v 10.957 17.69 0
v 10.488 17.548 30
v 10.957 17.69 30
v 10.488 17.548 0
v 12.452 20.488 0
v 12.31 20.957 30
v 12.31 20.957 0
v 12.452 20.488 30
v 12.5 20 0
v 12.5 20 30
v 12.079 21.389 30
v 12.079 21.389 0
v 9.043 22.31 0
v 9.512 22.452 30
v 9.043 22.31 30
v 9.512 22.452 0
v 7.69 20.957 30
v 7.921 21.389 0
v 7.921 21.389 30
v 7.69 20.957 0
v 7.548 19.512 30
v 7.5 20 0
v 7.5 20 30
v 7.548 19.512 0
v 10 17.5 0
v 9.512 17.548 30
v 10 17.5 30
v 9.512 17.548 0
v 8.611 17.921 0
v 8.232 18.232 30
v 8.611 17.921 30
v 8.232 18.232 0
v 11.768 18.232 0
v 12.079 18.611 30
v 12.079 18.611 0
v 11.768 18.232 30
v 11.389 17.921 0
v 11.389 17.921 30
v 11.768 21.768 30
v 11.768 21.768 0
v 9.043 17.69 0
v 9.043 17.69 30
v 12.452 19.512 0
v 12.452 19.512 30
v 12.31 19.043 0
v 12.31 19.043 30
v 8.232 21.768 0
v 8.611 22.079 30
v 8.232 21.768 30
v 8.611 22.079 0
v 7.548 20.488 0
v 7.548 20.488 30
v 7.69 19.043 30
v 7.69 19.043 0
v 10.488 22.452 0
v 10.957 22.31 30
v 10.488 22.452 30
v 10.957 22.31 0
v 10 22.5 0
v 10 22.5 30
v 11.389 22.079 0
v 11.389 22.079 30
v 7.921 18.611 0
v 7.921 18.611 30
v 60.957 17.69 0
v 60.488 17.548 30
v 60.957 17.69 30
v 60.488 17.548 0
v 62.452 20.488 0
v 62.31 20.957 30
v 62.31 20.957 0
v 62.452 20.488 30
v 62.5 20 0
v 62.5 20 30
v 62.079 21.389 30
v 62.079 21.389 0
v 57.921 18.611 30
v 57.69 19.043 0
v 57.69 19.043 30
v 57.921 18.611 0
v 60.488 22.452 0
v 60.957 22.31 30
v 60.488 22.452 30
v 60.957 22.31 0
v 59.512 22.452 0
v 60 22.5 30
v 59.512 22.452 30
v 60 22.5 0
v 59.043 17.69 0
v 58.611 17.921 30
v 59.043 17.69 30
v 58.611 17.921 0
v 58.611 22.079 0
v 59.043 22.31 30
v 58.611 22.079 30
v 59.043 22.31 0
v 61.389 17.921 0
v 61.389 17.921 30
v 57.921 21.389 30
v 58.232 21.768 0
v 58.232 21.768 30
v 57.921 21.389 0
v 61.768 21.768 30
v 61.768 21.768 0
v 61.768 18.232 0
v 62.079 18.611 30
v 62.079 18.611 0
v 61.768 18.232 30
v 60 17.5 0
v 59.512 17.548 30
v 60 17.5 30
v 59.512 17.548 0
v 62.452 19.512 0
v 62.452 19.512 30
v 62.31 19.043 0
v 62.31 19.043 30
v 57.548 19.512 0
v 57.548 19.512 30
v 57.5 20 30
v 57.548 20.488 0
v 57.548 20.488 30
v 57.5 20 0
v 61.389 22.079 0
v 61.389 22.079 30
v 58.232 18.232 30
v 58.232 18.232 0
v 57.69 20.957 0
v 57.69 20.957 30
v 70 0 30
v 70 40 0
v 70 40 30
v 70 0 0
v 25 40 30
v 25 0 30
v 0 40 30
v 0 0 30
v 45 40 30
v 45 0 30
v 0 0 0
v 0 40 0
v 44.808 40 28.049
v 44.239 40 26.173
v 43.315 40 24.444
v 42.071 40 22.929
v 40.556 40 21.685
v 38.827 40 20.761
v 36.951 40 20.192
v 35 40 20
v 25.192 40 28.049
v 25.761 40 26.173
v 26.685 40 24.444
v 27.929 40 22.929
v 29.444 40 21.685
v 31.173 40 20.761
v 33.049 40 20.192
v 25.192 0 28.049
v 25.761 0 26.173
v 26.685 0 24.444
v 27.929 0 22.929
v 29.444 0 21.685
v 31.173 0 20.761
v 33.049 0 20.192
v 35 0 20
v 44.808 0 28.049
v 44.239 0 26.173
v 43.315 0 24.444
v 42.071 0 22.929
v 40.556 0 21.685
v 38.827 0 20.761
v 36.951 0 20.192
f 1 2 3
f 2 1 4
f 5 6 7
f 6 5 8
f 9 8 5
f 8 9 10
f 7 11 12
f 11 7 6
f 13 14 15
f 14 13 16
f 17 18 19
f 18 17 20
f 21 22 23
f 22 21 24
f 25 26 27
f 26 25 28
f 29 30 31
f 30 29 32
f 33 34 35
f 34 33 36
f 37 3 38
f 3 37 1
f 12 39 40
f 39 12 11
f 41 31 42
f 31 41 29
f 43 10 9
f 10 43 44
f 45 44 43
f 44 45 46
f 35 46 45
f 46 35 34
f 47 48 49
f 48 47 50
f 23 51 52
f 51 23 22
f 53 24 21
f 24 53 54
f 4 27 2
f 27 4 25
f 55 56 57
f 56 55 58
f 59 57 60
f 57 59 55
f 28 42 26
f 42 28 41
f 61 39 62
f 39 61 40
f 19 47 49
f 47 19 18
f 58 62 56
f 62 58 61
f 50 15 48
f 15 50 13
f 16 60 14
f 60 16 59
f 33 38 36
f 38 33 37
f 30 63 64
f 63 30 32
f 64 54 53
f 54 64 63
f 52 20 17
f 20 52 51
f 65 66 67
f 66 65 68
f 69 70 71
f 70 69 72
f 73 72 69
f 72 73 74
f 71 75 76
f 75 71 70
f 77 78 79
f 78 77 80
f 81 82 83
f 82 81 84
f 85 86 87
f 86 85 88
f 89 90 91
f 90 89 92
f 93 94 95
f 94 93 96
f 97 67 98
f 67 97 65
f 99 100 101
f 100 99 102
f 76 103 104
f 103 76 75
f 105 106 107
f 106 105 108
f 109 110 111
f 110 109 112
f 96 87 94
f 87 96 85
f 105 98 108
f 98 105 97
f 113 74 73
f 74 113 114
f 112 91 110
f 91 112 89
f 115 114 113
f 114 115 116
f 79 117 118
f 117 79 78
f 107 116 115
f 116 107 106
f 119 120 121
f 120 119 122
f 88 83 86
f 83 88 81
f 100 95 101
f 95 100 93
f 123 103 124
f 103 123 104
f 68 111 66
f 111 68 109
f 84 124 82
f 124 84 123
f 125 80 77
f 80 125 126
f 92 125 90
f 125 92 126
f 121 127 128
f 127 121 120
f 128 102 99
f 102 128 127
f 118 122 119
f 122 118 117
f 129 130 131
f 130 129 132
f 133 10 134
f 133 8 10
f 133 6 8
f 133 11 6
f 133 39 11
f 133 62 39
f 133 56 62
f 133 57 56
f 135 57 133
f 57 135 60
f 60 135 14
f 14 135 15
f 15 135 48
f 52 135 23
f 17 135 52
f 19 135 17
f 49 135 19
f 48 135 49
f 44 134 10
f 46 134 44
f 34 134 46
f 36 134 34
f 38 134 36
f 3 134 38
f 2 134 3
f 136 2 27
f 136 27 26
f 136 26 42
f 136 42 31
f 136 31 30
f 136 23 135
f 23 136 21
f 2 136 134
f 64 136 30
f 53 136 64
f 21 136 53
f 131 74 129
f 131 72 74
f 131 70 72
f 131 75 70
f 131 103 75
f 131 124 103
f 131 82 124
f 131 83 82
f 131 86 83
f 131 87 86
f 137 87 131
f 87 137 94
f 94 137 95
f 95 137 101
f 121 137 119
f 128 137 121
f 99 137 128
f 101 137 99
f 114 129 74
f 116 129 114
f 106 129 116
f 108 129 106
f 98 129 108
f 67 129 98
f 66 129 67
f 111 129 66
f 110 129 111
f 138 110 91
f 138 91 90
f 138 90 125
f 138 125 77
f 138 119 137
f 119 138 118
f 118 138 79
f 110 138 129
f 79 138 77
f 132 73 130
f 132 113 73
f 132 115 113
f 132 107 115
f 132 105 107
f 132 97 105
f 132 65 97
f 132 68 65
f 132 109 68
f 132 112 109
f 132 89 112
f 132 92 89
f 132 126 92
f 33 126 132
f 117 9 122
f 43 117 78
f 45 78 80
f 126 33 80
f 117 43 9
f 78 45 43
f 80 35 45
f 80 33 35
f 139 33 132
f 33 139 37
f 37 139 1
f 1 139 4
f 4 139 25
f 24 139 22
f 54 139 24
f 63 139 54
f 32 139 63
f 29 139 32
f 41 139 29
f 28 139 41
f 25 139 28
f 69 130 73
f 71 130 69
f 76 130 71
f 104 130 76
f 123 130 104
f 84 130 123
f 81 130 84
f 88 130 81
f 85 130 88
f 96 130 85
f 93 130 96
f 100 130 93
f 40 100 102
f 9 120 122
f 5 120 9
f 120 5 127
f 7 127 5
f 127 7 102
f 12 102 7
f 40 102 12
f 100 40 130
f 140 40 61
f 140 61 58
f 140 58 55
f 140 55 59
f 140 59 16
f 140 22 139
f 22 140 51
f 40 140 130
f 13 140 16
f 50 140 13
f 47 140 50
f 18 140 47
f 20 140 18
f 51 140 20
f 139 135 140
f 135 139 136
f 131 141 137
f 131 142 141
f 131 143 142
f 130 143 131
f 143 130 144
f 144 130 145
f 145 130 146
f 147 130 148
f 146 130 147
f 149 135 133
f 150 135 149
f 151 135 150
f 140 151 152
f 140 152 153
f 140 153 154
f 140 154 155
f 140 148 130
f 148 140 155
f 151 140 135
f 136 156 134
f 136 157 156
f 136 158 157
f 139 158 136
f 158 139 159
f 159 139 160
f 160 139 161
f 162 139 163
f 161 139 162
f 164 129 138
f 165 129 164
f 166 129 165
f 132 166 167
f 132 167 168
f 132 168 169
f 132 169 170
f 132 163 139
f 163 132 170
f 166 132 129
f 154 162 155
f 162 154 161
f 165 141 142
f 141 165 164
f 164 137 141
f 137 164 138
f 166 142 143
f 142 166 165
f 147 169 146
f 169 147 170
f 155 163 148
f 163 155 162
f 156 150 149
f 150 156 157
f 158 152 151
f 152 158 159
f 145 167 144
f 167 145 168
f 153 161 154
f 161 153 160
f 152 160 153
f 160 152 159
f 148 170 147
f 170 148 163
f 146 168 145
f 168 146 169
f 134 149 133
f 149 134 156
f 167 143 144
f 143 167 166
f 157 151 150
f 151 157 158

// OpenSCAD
$fn = 32;

// ----------------------------------------------------------------------
// Saddle clamp: plain shaft clamp
// ----------------------------------------------------------------------

// --- parameters (mm) ---
blk_l = 70;               // block length, X
blk_w = 40;               // block width, Y
blk_h = 30;               // block height
clamp_r = 10;             // shaft groove radius
hole_r = 2.5;             // bolt hole radius
hole_m = 10;              // bolt hole margin from the ends

saw_depth = clamp_r + 3;  // saw kerf depth

difference() {
  cube([blk_l, blk_w, blk_h]);
  translate([blk_l / 2, -1, blk_h])
    rotate([-90, 0, 0])
      cylinder(h = blk_w + 2, r = clamp_r);
  for (sx = [0, 1])
    translate([sx ? blk_l - hole_m : hole_m, blk_w / 2, -1])
      cylinder(r = hole_r, h = blk_h + 2);
}
